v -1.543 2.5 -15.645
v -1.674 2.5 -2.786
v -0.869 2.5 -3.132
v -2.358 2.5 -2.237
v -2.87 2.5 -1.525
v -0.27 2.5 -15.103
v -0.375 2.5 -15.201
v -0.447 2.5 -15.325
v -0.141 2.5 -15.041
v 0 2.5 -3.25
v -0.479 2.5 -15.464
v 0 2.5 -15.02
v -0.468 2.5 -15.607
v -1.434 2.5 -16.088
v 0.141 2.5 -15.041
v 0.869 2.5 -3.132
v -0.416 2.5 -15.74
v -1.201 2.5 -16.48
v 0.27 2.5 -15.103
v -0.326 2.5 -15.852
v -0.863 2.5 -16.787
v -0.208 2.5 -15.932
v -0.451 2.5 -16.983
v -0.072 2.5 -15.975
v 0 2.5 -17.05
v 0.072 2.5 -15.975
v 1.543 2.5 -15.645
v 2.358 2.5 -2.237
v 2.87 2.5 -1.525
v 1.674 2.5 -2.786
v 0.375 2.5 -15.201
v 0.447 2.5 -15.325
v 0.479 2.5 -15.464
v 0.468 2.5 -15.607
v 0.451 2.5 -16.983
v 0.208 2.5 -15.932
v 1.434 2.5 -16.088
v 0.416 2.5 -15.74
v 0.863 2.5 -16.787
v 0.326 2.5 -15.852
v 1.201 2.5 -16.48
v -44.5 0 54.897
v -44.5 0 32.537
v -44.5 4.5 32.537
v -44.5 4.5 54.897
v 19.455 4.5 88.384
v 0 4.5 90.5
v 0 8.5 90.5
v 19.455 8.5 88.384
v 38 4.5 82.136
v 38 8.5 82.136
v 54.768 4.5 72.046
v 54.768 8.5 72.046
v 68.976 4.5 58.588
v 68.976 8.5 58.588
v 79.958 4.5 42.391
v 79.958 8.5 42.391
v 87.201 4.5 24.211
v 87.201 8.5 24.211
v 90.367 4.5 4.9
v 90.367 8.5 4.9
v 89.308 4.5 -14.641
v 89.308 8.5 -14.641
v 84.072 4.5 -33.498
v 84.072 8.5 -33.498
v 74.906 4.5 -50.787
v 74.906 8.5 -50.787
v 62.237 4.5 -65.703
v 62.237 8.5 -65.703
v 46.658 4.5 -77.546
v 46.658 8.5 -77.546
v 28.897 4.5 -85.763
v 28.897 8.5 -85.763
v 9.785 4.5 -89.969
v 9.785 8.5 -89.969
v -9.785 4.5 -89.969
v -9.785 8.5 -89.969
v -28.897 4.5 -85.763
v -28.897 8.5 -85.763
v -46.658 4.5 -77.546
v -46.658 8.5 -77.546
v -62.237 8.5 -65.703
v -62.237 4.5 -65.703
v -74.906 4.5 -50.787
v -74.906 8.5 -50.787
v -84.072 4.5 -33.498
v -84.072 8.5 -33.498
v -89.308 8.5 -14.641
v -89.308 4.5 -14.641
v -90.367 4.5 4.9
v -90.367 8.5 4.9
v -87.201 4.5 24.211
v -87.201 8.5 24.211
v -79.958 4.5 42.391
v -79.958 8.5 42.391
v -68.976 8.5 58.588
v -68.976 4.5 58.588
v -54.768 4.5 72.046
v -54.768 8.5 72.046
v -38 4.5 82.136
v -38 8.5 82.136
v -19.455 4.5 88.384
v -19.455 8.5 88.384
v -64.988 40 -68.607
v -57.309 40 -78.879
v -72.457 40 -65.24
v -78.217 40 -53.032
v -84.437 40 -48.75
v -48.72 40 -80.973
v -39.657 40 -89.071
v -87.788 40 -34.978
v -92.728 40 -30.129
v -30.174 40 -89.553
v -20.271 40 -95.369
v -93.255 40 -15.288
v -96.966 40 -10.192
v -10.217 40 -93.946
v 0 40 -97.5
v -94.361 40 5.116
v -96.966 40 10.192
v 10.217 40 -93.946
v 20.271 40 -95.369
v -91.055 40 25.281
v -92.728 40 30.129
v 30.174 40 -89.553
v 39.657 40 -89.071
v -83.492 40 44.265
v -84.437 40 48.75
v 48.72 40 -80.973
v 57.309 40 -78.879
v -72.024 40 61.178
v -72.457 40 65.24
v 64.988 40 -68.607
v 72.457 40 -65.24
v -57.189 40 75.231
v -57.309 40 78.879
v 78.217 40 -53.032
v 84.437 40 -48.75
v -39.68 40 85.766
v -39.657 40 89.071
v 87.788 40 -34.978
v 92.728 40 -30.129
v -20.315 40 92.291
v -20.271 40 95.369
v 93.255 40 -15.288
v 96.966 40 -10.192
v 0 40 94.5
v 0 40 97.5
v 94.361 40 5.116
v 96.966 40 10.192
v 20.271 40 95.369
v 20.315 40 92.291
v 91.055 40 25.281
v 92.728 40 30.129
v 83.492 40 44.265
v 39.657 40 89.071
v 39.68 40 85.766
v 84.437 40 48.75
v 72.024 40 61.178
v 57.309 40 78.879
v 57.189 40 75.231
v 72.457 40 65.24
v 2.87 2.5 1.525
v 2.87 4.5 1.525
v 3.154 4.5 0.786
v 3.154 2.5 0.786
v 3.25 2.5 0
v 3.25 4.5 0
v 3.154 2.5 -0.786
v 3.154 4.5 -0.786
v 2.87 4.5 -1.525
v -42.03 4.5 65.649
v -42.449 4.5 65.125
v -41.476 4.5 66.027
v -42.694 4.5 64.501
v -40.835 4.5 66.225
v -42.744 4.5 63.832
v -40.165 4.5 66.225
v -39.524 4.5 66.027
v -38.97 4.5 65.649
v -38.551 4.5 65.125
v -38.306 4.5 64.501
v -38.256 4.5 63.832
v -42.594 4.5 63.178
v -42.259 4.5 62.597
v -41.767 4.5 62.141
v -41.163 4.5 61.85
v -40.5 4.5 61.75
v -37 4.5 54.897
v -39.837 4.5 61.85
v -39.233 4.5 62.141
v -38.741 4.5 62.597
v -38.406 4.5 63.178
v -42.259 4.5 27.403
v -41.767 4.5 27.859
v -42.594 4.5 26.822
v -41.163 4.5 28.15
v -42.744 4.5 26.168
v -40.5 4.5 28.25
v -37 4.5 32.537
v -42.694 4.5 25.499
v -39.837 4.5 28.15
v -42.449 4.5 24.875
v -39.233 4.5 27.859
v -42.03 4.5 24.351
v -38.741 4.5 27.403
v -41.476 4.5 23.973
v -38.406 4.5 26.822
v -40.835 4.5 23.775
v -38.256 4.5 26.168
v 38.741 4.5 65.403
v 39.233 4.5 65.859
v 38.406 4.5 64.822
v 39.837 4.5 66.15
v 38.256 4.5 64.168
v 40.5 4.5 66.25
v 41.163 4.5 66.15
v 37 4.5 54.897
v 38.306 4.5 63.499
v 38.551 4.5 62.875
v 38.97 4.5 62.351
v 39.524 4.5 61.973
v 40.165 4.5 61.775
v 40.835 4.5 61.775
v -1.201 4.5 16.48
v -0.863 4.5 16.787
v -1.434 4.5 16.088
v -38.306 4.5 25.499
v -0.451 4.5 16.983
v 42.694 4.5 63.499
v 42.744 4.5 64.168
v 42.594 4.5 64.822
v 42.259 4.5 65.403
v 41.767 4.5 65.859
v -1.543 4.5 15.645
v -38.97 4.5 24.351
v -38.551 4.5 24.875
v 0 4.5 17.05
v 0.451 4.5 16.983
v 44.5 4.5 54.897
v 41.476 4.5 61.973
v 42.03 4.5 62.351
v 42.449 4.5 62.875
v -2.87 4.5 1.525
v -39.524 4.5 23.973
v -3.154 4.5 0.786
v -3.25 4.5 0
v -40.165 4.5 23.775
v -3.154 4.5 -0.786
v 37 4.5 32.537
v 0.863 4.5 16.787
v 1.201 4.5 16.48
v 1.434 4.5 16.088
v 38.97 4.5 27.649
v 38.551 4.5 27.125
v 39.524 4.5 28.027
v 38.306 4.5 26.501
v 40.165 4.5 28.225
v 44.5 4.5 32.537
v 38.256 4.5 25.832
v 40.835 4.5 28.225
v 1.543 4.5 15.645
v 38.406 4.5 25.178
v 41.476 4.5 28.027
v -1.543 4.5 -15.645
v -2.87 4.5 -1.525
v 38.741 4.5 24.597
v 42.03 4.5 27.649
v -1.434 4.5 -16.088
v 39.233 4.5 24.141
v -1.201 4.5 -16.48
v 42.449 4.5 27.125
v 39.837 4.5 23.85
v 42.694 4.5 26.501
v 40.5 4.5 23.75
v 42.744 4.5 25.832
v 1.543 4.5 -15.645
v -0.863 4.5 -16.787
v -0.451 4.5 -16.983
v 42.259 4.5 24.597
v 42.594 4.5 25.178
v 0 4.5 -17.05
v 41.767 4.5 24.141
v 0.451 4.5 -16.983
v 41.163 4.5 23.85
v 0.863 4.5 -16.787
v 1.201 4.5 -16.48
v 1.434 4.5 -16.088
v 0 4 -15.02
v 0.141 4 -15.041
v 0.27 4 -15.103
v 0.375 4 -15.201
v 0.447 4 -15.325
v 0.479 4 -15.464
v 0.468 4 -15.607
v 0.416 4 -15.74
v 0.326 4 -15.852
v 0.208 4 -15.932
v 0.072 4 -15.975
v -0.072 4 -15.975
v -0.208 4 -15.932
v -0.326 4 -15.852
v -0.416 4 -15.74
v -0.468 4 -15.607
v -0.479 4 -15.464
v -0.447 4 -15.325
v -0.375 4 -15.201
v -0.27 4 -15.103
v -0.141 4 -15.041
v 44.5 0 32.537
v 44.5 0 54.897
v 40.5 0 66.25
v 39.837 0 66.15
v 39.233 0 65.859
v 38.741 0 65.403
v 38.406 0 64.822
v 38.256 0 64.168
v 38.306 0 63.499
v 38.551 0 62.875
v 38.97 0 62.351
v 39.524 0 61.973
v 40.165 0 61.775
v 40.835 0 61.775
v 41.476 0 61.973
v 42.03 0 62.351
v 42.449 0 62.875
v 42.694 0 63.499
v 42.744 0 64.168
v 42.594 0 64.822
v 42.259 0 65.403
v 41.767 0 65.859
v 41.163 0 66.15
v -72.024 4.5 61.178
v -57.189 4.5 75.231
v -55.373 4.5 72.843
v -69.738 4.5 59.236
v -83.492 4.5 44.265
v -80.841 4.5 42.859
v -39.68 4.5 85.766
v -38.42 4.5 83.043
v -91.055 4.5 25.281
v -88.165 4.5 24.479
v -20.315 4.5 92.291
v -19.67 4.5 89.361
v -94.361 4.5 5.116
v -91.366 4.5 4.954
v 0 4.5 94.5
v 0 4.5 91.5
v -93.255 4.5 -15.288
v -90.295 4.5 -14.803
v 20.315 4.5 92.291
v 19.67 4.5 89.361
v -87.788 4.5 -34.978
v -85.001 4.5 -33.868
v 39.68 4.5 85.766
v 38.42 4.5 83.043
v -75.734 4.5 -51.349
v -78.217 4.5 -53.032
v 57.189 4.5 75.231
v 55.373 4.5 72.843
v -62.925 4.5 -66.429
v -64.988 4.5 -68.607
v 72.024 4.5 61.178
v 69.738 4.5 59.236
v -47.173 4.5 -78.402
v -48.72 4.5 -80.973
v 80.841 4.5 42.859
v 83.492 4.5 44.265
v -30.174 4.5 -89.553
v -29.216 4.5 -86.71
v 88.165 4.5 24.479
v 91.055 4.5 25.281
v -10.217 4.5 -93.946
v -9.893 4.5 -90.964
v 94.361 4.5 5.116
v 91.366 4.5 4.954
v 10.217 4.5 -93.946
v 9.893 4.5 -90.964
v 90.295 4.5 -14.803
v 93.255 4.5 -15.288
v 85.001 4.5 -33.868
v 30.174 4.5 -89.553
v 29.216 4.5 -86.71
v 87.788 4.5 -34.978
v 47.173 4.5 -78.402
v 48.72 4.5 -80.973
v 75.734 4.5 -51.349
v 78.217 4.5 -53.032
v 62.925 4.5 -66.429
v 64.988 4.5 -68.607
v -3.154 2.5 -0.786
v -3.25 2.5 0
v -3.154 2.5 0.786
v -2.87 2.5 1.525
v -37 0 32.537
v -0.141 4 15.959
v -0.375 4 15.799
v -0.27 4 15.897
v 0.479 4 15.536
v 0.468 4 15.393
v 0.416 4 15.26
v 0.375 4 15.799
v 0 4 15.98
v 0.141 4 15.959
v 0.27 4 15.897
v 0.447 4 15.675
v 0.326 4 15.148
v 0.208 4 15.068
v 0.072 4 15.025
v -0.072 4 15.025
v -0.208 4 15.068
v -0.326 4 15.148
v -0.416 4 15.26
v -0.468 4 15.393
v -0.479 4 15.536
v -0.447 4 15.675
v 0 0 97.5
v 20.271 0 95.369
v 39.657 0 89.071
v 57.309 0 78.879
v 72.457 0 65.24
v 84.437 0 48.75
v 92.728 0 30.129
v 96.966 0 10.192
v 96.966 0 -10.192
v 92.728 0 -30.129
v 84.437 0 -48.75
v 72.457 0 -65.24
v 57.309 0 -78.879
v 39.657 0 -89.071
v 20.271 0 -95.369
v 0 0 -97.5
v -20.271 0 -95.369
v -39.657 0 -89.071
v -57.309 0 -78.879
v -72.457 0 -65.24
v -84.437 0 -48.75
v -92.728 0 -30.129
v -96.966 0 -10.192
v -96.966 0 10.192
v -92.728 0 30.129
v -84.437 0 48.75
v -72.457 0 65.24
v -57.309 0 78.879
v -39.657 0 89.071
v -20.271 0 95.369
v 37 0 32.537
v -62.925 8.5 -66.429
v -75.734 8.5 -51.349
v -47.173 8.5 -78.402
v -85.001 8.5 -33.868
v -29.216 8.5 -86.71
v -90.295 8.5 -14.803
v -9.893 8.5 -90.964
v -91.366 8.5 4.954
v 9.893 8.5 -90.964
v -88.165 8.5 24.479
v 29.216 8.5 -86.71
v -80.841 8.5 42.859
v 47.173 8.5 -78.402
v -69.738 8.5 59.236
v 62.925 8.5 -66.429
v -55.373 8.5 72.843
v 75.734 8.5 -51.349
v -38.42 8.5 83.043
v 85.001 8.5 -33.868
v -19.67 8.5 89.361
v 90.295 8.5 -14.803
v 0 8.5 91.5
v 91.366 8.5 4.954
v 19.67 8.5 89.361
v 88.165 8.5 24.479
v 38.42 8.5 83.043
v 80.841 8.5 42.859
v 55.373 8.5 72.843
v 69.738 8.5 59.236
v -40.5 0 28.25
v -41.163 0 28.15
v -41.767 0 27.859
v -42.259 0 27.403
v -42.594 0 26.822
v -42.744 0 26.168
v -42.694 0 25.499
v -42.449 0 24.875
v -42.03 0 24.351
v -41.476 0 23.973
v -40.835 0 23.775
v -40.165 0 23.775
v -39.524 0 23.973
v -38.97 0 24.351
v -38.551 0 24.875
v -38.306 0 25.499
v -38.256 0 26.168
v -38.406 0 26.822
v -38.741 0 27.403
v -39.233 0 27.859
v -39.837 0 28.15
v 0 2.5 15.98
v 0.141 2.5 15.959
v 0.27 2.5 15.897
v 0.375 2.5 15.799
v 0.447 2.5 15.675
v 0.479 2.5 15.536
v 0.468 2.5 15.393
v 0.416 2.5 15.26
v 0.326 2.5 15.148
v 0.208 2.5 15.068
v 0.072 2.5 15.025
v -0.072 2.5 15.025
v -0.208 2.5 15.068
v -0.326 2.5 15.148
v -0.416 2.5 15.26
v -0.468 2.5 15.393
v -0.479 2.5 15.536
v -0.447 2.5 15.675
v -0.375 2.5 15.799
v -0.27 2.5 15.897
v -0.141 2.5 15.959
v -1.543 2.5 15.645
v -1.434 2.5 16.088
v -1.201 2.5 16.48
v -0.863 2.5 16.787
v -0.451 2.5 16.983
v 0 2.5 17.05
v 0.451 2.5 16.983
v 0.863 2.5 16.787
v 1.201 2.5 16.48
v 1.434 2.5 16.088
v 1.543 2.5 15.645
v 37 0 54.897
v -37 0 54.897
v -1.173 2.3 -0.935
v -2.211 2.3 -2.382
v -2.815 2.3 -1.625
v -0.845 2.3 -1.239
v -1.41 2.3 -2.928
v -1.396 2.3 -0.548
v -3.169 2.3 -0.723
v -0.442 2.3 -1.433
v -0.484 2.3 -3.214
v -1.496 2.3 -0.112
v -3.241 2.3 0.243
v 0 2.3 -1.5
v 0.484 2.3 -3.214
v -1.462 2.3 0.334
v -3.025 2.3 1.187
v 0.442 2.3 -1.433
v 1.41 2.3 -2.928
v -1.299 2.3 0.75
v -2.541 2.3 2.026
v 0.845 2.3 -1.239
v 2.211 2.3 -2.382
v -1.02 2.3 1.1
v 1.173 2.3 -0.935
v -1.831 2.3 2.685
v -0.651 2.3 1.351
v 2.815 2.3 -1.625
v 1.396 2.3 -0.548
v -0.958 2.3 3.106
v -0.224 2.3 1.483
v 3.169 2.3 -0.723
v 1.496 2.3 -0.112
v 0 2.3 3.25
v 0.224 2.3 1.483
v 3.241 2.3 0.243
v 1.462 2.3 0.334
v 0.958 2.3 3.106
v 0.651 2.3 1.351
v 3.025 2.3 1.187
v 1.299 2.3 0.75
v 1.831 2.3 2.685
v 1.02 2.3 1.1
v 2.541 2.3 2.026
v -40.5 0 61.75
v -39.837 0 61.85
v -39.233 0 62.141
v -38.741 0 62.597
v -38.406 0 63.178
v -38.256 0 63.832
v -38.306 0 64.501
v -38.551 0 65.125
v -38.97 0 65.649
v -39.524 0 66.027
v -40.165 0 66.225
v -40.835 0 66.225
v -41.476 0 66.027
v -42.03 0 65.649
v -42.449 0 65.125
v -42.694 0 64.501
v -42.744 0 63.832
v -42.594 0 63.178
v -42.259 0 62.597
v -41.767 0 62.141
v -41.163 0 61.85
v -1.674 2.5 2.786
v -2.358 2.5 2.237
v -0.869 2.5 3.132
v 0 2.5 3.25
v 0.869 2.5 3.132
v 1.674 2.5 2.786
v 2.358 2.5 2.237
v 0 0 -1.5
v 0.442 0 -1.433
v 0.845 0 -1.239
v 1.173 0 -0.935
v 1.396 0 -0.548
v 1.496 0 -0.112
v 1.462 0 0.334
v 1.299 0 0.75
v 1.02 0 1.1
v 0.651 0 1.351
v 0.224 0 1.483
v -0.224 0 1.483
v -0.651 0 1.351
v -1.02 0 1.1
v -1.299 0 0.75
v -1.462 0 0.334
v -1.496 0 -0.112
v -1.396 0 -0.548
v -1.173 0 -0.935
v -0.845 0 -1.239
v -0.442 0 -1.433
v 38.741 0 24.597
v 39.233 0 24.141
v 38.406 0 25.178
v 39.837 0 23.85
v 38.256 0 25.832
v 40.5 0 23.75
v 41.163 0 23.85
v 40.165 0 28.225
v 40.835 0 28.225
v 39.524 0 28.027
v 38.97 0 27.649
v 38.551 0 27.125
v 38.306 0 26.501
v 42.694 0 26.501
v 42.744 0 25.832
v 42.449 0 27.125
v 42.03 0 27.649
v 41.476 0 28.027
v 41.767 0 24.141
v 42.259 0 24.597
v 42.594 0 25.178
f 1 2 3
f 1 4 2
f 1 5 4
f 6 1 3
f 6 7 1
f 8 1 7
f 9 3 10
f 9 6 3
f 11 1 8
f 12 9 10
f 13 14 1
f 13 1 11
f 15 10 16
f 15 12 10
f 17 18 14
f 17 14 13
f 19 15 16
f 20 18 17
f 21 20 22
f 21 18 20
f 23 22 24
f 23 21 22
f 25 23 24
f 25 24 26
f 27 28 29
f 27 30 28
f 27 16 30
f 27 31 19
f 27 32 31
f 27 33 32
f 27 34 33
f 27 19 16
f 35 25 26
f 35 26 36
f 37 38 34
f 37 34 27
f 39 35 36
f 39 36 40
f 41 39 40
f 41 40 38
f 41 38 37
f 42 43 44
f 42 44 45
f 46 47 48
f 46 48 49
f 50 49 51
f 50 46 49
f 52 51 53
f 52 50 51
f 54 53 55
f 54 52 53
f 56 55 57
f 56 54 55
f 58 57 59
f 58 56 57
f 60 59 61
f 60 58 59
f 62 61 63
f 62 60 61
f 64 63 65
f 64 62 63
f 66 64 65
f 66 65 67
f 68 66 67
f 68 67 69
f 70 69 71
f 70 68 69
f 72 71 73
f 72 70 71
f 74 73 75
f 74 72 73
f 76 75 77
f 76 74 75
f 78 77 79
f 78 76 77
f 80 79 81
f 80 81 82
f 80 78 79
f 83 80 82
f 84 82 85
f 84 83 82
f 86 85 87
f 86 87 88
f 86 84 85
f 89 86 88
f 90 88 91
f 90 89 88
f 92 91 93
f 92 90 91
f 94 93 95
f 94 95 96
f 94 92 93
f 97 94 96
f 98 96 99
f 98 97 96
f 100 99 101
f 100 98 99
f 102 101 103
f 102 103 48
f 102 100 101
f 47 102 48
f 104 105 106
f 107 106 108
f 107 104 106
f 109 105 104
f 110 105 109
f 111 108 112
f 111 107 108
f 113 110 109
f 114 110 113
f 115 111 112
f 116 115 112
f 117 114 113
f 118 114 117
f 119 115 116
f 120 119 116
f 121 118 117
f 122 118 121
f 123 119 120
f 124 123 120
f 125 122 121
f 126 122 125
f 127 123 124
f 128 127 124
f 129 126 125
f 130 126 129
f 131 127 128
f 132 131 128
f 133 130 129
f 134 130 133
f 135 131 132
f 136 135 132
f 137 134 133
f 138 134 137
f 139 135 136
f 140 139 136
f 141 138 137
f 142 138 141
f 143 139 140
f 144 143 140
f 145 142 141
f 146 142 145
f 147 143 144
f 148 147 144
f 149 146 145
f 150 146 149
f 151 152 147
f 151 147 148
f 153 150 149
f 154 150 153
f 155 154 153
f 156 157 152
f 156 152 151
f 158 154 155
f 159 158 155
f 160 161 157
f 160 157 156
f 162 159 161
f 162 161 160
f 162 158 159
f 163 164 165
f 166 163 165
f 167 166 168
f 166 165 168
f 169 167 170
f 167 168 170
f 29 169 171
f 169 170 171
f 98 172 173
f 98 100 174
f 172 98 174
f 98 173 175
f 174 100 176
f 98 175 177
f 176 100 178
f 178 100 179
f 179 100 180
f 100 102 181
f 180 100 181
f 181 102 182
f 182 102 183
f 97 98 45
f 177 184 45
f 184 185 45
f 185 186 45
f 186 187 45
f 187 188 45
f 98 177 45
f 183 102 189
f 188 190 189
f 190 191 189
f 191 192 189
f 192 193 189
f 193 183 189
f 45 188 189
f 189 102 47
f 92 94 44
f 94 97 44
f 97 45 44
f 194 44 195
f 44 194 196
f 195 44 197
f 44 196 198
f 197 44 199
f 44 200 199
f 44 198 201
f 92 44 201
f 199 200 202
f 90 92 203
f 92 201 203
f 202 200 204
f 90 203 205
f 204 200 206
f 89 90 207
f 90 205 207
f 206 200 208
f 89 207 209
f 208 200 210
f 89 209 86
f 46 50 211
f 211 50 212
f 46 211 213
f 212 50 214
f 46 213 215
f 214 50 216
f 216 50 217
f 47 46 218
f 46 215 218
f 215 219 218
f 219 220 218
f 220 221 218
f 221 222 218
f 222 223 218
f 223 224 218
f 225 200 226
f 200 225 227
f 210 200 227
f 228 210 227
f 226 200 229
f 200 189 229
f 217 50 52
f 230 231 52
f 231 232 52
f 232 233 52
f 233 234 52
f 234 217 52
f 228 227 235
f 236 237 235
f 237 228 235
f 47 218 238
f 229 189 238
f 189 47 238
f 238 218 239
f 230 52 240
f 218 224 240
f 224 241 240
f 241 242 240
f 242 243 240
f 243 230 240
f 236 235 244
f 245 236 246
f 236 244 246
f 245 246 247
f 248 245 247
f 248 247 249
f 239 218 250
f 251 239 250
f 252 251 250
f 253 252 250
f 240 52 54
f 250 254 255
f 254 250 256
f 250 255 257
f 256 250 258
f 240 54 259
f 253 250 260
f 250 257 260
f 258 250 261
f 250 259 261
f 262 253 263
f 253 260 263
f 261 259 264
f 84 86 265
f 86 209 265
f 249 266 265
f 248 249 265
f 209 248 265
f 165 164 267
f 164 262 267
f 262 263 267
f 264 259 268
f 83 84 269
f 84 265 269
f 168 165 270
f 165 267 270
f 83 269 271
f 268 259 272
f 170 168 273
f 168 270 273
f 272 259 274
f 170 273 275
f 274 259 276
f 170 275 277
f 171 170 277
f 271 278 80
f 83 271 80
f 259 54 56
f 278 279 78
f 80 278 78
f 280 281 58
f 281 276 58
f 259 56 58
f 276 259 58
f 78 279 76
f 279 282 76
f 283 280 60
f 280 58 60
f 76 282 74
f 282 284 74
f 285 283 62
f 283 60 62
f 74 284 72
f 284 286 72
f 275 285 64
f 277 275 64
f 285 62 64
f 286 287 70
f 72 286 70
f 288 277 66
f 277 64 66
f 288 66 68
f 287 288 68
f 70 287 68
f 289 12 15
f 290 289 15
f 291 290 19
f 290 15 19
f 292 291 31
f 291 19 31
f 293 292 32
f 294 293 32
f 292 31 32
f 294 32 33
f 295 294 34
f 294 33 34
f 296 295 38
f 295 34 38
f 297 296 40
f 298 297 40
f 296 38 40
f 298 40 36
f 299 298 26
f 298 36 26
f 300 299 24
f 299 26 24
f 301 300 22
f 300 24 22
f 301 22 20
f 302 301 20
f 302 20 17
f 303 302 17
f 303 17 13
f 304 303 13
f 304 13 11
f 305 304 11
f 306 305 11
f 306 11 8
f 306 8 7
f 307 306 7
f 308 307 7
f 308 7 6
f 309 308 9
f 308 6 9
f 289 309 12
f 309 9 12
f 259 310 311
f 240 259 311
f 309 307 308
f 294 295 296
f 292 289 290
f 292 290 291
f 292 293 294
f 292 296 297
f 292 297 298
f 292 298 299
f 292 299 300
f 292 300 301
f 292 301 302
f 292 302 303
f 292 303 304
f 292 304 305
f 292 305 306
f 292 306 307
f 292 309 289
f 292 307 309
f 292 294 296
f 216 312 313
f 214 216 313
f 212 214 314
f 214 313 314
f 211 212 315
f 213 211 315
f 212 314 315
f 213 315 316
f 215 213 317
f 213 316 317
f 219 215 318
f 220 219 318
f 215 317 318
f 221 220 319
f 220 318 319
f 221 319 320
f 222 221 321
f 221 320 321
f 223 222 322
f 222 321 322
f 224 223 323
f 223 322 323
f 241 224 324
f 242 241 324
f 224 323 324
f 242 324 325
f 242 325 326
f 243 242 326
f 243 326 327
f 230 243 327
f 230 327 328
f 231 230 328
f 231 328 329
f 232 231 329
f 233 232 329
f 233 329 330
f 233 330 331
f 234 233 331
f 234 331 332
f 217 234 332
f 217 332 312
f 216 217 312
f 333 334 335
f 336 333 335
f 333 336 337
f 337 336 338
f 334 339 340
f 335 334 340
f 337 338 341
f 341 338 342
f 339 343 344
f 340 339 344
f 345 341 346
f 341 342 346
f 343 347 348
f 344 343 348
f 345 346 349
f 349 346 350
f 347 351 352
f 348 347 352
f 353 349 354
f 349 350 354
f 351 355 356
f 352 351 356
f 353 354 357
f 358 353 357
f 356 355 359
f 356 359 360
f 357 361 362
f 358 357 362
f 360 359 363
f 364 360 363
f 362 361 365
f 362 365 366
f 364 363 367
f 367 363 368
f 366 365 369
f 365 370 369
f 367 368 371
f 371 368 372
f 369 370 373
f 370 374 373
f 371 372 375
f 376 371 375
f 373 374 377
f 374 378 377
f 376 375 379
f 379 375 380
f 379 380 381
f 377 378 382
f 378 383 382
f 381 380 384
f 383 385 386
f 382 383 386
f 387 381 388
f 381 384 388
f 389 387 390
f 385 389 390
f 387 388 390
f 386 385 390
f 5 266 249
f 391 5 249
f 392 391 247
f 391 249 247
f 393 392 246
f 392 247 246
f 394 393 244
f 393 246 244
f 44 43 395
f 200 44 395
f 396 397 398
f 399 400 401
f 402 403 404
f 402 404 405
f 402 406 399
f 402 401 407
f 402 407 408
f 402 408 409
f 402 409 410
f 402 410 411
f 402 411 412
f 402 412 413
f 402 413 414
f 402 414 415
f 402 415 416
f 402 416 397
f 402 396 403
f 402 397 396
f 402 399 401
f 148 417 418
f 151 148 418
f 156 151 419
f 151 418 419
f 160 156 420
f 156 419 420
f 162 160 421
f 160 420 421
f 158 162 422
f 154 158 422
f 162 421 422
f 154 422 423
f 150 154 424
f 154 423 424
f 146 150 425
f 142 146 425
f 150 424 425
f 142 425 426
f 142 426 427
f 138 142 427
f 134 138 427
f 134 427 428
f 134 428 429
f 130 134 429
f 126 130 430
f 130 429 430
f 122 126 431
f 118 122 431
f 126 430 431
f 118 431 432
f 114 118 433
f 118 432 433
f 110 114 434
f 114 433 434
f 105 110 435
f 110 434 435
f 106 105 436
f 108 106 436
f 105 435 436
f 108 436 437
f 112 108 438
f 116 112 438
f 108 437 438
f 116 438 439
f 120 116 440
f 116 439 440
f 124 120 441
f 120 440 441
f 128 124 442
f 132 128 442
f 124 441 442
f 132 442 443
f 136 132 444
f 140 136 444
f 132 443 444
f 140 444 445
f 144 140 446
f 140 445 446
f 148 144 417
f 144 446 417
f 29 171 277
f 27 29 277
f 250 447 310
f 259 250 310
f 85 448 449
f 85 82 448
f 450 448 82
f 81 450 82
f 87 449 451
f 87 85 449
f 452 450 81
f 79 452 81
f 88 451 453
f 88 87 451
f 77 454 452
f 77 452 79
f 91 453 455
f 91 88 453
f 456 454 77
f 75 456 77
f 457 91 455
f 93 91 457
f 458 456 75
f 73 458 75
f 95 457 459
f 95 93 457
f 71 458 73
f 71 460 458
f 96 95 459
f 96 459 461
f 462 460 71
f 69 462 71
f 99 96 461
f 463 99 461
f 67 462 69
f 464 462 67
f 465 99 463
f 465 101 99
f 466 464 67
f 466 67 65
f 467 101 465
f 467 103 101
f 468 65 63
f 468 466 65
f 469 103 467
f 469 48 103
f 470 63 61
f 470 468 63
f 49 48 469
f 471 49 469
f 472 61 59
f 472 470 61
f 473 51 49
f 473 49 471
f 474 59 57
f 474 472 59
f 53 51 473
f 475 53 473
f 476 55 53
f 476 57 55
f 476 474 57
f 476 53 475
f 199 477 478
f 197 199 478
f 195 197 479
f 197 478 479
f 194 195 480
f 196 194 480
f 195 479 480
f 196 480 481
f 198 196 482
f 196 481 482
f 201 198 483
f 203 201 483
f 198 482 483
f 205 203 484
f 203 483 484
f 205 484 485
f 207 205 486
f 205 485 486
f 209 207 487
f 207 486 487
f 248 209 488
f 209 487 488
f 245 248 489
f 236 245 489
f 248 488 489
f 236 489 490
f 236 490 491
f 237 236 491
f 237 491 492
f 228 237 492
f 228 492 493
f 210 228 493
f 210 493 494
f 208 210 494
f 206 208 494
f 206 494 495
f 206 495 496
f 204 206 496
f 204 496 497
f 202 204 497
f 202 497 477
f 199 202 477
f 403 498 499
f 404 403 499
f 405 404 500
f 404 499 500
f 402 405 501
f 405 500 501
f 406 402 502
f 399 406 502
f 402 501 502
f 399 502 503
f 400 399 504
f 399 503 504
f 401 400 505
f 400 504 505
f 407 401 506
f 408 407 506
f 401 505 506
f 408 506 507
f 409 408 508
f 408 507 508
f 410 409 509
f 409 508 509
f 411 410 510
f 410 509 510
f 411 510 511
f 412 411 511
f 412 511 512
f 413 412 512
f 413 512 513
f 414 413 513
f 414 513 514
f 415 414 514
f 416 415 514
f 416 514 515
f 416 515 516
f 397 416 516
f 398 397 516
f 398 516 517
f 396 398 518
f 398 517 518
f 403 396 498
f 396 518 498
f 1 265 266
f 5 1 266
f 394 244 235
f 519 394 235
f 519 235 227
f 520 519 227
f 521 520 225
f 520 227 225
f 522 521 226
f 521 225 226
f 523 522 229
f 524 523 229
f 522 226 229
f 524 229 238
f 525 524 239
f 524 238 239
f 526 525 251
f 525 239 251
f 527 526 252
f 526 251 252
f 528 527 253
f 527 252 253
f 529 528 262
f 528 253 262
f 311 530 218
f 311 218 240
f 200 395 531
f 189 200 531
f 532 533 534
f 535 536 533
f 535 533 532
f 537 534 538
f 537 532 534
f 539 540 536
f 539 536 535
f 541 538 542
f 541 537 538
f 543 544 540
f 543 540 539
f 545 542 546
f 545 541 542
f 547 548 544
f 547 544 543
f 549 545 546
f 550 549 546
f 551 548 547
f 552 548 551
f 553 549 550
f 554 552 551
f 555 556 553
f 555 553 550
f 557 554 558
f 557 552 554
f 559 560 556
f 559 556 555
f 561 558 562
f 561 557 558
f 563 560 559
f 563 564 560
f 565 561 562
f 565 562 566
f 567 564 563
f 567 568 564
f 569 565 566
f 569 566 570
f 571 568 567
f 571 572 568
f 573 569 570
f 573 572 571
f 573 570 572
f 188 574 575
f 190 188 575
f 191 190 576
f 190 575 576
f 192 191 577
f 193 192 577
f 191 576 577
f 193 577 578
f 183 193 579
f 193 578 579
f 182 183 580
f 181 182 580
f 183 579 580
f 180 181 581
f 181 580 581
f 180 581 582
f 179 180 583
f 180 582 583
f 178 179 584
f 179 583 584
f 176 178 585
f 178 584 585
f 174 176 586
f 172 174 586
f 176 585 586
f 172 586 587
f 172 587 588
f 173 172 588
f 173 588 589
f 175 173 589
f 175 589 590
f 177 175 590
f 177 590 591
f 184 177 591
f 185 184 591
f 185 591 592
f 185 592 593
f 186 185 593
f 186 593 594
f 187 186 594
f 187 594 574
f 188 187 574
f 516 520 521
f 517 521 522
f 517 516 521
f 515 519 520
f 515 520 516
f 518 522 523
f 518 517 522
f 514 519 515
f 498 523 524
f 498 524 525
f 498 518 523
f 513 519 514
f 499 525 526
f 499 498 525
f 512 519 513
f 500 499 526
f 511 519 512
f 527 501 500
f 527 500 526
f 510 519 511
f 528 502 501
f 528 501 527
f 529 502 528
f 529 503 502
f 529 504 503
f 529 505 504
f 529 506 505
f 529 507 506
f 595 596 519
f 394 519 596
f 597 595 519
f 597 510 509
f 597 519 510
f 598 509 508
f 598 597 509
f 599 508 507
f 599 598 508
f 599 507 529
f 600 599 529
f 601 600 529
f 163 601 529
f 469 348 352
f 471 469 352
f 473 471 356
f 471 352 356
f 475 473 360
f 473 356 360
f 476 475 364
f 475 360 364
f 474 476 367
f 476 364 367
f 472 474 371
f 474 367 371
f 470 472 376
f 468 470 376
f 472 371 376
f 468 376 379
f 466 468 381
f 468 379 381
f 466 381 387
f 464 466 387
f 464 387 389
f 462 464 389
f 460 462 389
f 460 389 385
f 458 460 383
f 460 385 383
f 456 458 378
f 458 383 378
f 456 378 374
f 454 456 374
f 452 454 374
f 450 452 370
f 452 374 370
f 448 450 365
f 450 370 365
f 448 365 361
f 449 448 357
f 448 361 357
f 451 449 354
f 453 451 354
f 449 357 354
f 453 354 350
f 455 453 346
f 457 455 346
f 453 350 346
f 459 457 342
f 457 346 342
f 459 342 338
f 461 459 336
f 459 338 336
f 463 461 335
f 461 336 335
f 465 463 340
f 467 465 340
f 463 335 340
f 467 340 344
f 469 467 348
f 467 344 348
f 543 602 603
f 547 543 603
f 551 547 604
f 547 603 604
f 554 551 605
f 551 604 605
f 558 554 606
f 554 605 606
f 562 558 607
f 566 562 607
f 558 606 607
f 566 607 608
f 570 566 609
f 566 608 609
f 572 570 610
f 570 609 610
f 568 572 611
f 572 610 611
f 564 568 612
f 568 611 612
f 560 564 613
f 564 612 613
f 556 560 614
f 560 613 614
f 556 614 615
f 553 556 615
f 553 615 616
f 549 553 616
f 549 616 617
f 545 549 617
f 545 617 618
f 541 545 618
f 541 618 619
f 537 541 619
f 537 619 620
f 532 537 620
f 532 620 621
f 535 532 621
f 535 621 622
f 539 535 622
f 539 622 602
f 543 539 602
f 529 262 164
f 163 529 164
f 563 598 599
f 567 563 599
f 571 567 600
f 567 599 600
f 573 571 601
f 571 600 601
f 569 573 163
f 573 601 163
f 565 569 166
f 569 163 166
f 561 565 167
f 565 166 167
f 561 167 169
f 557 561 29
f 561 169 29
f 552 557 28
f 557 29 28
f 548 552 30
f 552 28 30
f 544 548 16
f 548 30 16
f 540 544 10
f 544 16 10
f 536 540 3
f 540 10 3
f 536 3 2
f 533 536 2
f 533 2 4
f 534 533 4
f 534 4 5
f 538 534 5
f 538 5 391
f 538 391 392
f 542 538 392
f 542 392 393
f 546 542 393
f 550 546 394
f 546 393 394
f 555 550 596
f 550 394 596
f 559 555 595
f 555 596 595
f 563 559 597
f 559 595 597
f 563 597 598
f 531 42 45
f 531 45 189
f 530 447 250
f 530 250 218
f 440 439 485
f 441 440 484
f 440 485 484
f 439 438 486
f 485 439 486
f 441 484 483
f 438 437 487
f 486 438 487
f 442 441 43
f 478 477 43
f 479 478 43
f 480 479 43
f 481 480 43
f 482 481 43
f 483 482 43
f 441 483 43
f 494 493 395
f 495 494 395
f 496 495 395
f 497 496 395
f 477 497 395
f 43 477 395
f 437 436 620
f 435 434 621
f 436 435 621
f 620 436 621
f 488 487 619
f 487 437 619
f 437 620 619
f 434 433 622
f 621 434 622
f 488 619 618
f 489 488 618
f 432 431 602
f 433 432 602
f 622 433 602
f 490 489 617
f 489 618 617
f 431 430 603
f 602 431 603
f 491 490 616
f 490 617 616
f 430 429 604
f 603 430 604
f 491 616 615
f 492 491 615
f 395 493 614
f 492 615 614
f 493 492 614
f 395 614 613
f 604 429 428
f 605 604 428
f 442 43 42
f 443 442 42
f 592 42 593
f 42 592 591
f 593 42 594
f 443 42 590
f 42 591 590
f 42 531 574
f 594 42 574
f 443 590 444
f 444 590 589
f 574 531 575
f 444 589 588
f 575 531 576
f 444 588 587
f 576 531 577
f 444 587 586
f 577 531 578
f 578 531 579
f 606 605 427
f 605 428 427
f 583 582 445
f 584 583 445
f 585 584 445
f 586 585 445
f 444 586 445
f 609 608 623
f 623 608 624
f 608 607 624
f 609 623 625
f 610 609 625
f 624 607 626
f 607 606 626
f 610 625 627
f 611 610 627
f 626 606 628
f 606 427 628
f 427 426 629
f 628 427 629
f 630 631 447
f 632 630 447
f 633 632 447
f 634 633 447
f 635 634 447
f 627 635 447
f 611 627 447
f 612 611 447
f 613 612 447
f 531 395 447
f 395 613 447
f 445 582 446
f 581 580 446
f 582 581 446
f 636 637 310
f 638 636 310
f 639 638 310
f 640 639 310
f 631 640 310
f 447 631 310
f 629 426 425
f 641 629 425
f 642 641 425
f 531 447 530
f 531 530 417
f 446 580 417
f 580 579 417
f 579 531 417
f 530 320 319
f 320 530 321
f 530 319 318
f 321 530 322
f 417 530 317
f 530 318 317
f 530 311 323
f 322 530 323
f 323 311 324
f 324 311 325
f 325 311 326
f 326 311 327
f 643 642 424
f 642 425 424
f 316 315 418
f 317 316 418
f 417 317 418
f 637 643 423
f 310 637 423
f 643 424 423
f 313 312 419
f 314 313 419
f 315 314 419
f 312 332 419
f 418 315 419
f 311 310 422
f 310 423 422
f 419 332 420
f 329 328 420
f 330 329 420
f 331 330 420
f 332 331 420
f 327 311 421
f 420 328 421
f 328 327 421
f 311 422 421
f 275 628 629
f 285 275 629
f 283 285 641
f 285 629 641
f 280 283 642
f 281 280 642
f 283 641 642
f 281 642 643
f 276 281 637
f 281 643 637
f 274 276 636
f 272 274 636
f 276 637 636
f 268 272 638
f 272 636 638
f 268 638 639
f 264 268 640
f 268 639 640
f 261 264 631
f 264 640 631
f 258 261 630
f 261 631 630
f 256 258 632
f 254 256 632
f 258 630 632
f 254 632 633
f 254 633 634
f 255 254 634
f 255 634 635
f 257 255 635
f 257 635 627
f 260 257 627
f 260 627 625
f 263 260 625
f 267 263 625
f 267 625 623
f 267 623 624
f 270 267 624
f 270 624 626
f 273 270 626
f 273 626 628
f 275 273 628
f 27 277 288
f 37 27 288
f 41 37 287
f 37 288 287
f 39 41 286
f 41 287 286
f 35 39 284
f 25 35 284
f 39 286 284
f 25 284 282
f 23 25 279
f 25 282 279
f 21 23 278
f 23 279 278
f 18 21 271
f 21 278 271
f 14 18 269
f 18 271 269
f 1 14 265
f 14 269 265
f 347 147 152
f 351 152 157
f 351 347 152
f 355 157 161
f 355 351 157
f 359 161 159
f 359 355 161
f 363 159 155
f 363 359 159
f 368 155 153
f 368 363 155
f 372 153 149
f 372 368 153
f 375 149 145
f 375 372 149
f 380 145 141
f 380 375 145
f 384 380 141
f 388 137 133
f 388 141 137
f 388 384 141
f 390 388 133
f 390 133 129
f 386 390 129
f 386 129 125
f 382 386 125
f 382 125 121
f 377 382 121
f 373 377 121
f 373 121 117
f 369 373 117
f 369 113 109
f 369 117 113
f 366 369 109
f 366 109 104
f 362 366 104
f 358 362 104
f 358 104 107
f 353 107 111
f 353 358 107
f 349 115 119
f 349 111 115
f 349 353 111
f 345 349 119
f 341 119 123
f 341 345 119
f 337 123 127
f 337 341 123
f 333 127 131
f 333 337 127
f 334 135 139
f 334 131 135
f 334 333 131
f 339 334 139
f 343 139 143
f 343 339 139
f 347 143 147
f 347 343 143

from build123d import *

# Parameters (mm, degrees)
SKETCH3_R                 = 97.5
BOSS_EXTRUDE3_DEPTH       = 40
SHELL4_T                  = -3
SHELL4_THICKNESS_2_FACE_R = 94.5
SHELL4_THICKNESS_2_DEPTH  = 1.5
CUT_EXTRUDE1_DEPTH        = 2
CUT_EXTRUDE2_REACH        = 145.571
SKETCH5_R                 = 1.5
SKETCH6_R                 = 3.25
CUT_EXTRUDE3_DEPTH        = 0.2
SKETCH7_R                 = 0.48
BOSS_EXTRUDE4_DEPTH       = 1.5
SKETCH8_R                 = 91.5
SKETCH8_R_2               = 90.5
BOSS_EXTRUDE5_DEPTH       = 4
CUT_EXTRUDE12_REACH       = 145.571
SKETCH9_R                 = 2.25
CUT_EXTRUDE13_REACH       = 145.571
SKETCH9_4_W               = 7.5
SKETCH9_4_H               = 22.36


with BuildPart() as part:
    # Sketch3 → Boss-Extrude3 (new body)
    with BuildSketch(Plane(origin=(0, 0, 0), x_dir=(1, 0, 0), z_dir=(0, 1, 0))):
        with Locations(Location((0, 0, 0), (0, 0, 270))):
            Circle(SKETCH3_R)
    extrude(amount=BOSS_EXTRUDE3_DEPTH)

    # Shell4
    shell4_openings = [part.faces().sort_by_distance(p)[0] for p in [
        (0, 40, 0),
    ]]
    offset(amount=SHELL4_T, openings=shell4_openings, kind=Kind.INTERSECTION)

    # Shell4 thickness 2 face (on inner face of the shell) → Shell4 thickness 2 (add)
    with BuildSketch(Plane(origin=(0, 3, 0), x_dir=(0, 0, -1), z_dir=(0, -1, 0))):
        Circle(SHELL4_THICKNESS_2_FACE_R)
    extrude(amount=-SHELL4_THICKNESS_2_DEPTH)

    # Sketch4 → Cut-Extrude1 (cut)
    with BuildSketch(Plane(origin=(0, 4.5, 0), x_dir=(1, 0, 0), z_dir=(0, 1, 0))):
        with BuildLine():
            Line((2.869908719, 1.525163579), (1.543202838, 15.645))
            ThreePointArc((1.543202838, 15.645), (0, 17.05), (-1.543202838, 15.645))
            Line((-1.543202838, 15.645), (-2.869908719, 1.525163579))
            ThreePointArc((-2.869908719, 1.525163579), (-3.25, 0), (-2.869908719, -1.525163579))
            Line((-2.869908719, -1.525163579), (-1.543202838, -15.645))
            ThreePointArc((-1.543202838, -15.645), (0, -17.05), (1.543202838, -15.645))
            Line((1.543202838, -15.645), (2.869908719, -1.525163579))
            ThreePointArc((2.869908719, -1.525163579), (3.25, 0), (2.869908719, 1.525163579))
        make_face()
    extrude(amount=-CUT_EXTRUDE1_DEPTH, mode=Mode.SUBTRACT)

    # Sketch5 → Cut-Extrude2 (cut, up to next)
    with BuildSketch(Plane.XZ, mode=Mode.PRIVATE) as cut_extrude2_sk1:
        with Locations(Location((0, 0, 0), (0, 0, 270))):
            Circle(SKETCH5_R)
    cut_extrude2_tool1 = extrude(cut_extrude2_sk1.sketch, amount=-CUT_EXTRUDE2_REACH, mode=Mode.PRIVATE) & part.part
    add(cut_extrude2_tool1.solids().sort_by_distance((0, 0, 0))[0], mode=Mode.SUBTRACT)

    # Sketch6 → Cut-Extrude3 (cut)
    with BuildSketch(Plane(origin=(0, 2.5, 0), x_dir=(1, 0, 0), z_dir=(0, 1, 0))):
        with Locations(Location((0, 0, 0), (0, 0, 270))):
            Circle(SKETCH6_R)
    extrude(amount=-CUT_EXTRUDE3_DEPTH, mode=Mode.SUBTRACT)

    # Sketch7 → Boss-Extrude4 (add)
    with BuildSketch(Plane(origin=(0, 2.5, 0), x_dir=(1, 0, 0), z_dir=(0, 1, 0))):
        with Locations(Location((0, 15.5, 0), (0, 0, 270))):
            Circle(SKETCH7_R)
        with Locations(Location((0, -15.5, 0), (0, 0, 270))):
            Circle(SKETCH7_R)
    extrude(amount=BOSS_EXTRUDE4_DEPTH)

    # Sketch8 → Boss-Extrude5 (add)
    with BuildSketch(Plane(origin=(0, 4.5, 0), x_dir=(1, 0, 0), z_dir=(0, 1, 0))):
        with Locations(Location((0, 0, 0), (0, 0, 270))):
            Circle(SKETCH8_R)
        with Locations(Location((0, 0, 0), (0, 0, 270))):
            Circle(SKETCH8_R_2, mode=Mode.SUBTRACT)
    extrude(amount=BOSS_EXTRUDE5_DEPTH)

    # Sketch9 → Cut-Extrude12 (cut, up to next)
    with BuildSketch(Plane.XZ, mode=Mode.PRIVATE) as cut_extrude12_sk1:
        with Locations(Location((40.5, 26, 0), (0, 0, 270))):
            Circle(SKETCH9_R)
    cut_extrude12_tool1 = extrude(cut_extrude12_sk1.sketch, amount=-CUT_EXTRUDE12_REACH, mode=Mode.PRIVATE) & part.part
    # Sketch9 → Cut-Extrude12 (cut, up to next)
    with BuildSketch(Plane.XZ, mode=Mode.PRIVATE) as cut_extrude12_sk2:
        with Locations(Location((40.5, 64, 0), (0, 0, 90))):
            Circle(SKETCH9_R)
    cut_extrude12_tool2 = extrude(cut_extrude12_sk2.sketch, amount=-CUT_EXTRUDE12_REACH, mode=Mode.PRIVATE) & part.part
    # Sketch9 → Cut-Extrude12 (cut, up to next)
    with BuildSketch(Plane.XZ, mode=Mode.PRIVATE) as cut_extrude12_sk3:
        with Locations(Location((-40.5, 64, 0), (0, 0, 270))):
            Circle(SKETCH9_R)
    cut_extrude12_tool3 = extrude(cut_extrude12_sk3.sketch, amount=-CUT_EXTRUDE12_REACH, mode=Mode.PRIVATE) & part.part
    # Sketch9 → Cut-Extrude12 (cut, up to next)
    with BuildSketch(Plane.XZ, mode=Mode.PRIVATE) as cut_extrude12_sk4:
        with Locations(Location((-40.5, 26, 0), (0, 0, 90))):
            Circle(SKETCH9_R)
    cut_extrude12_tool4 = extrude(cut_extrude12_sk4.sketch, amount=-CUT_EXTRUDE12_REACH, mode=Mode.PRIVATE) & part.part
    add(cut_extrude12_tool1.solids().sort_by_distance((40.5, 0, 26))[0], mode=Mode.SUBTRACT)
    add(cut_extrude12_tool2.solids().sort_by_distance((40.5, 0, 64))[0], mode=Mode.SUBTRACT)
    add(cut_extrude12_tool3.solids().sort_by_distance((-40.5, 0, 64))[0], mode=Mode.SUBTRACT)
    add(cut_extrude12_tool4.solids().sort_by_distance((-40.5, 0, 26))[0], mode=Mode.SUBTRACT)

    # Sketch9<4> → Cut-Extrude13 (cut, up to next)
    with BuildSketch(Plane.XZ, mode=Mode.PRIVATE) as cut_extrude13_sk1:
        with Locations((40.75, 43.717267505)):
            Rectangle(SKETCH9_4_W, SKETCH9_4_H)
    cut_extrude13_tool1 = extrude(cut_extrude13_sk1.sketch, amount=-CUT_EXTRUDE13_REACH, mode=Mode.PRIVATE) & part.part
    # Sketch9<4> → Cut-Extrude13 (cut, up to next)
    with BuildSketch(Plane.XZ, mode=Mode.PRIVATE) as cut_extrude13_sk2:
        with Locations((-40.75, 43.717267505)):
            Rectangle(SKETCH9_4_W, SKETCH9_4_H)
    cut_extrude13_tool2 = extrude(cut_extrude13_sk2.sketch, amount=-CUT_EXTRUDE13_REACH, mode=Mode.PRIVATE) & part.part
    add(cut_extrude13_tool1.solids().sort_by_distance((40.75, 0, 43.717268))[0], mode=Mode.SUBTRACT)
    add(cut_extrude13_tool2.solids().sort_by_distance((-40.75, 0, 43.717268))[0], mode=Mode.SUBTRACT)


solid = part.part
